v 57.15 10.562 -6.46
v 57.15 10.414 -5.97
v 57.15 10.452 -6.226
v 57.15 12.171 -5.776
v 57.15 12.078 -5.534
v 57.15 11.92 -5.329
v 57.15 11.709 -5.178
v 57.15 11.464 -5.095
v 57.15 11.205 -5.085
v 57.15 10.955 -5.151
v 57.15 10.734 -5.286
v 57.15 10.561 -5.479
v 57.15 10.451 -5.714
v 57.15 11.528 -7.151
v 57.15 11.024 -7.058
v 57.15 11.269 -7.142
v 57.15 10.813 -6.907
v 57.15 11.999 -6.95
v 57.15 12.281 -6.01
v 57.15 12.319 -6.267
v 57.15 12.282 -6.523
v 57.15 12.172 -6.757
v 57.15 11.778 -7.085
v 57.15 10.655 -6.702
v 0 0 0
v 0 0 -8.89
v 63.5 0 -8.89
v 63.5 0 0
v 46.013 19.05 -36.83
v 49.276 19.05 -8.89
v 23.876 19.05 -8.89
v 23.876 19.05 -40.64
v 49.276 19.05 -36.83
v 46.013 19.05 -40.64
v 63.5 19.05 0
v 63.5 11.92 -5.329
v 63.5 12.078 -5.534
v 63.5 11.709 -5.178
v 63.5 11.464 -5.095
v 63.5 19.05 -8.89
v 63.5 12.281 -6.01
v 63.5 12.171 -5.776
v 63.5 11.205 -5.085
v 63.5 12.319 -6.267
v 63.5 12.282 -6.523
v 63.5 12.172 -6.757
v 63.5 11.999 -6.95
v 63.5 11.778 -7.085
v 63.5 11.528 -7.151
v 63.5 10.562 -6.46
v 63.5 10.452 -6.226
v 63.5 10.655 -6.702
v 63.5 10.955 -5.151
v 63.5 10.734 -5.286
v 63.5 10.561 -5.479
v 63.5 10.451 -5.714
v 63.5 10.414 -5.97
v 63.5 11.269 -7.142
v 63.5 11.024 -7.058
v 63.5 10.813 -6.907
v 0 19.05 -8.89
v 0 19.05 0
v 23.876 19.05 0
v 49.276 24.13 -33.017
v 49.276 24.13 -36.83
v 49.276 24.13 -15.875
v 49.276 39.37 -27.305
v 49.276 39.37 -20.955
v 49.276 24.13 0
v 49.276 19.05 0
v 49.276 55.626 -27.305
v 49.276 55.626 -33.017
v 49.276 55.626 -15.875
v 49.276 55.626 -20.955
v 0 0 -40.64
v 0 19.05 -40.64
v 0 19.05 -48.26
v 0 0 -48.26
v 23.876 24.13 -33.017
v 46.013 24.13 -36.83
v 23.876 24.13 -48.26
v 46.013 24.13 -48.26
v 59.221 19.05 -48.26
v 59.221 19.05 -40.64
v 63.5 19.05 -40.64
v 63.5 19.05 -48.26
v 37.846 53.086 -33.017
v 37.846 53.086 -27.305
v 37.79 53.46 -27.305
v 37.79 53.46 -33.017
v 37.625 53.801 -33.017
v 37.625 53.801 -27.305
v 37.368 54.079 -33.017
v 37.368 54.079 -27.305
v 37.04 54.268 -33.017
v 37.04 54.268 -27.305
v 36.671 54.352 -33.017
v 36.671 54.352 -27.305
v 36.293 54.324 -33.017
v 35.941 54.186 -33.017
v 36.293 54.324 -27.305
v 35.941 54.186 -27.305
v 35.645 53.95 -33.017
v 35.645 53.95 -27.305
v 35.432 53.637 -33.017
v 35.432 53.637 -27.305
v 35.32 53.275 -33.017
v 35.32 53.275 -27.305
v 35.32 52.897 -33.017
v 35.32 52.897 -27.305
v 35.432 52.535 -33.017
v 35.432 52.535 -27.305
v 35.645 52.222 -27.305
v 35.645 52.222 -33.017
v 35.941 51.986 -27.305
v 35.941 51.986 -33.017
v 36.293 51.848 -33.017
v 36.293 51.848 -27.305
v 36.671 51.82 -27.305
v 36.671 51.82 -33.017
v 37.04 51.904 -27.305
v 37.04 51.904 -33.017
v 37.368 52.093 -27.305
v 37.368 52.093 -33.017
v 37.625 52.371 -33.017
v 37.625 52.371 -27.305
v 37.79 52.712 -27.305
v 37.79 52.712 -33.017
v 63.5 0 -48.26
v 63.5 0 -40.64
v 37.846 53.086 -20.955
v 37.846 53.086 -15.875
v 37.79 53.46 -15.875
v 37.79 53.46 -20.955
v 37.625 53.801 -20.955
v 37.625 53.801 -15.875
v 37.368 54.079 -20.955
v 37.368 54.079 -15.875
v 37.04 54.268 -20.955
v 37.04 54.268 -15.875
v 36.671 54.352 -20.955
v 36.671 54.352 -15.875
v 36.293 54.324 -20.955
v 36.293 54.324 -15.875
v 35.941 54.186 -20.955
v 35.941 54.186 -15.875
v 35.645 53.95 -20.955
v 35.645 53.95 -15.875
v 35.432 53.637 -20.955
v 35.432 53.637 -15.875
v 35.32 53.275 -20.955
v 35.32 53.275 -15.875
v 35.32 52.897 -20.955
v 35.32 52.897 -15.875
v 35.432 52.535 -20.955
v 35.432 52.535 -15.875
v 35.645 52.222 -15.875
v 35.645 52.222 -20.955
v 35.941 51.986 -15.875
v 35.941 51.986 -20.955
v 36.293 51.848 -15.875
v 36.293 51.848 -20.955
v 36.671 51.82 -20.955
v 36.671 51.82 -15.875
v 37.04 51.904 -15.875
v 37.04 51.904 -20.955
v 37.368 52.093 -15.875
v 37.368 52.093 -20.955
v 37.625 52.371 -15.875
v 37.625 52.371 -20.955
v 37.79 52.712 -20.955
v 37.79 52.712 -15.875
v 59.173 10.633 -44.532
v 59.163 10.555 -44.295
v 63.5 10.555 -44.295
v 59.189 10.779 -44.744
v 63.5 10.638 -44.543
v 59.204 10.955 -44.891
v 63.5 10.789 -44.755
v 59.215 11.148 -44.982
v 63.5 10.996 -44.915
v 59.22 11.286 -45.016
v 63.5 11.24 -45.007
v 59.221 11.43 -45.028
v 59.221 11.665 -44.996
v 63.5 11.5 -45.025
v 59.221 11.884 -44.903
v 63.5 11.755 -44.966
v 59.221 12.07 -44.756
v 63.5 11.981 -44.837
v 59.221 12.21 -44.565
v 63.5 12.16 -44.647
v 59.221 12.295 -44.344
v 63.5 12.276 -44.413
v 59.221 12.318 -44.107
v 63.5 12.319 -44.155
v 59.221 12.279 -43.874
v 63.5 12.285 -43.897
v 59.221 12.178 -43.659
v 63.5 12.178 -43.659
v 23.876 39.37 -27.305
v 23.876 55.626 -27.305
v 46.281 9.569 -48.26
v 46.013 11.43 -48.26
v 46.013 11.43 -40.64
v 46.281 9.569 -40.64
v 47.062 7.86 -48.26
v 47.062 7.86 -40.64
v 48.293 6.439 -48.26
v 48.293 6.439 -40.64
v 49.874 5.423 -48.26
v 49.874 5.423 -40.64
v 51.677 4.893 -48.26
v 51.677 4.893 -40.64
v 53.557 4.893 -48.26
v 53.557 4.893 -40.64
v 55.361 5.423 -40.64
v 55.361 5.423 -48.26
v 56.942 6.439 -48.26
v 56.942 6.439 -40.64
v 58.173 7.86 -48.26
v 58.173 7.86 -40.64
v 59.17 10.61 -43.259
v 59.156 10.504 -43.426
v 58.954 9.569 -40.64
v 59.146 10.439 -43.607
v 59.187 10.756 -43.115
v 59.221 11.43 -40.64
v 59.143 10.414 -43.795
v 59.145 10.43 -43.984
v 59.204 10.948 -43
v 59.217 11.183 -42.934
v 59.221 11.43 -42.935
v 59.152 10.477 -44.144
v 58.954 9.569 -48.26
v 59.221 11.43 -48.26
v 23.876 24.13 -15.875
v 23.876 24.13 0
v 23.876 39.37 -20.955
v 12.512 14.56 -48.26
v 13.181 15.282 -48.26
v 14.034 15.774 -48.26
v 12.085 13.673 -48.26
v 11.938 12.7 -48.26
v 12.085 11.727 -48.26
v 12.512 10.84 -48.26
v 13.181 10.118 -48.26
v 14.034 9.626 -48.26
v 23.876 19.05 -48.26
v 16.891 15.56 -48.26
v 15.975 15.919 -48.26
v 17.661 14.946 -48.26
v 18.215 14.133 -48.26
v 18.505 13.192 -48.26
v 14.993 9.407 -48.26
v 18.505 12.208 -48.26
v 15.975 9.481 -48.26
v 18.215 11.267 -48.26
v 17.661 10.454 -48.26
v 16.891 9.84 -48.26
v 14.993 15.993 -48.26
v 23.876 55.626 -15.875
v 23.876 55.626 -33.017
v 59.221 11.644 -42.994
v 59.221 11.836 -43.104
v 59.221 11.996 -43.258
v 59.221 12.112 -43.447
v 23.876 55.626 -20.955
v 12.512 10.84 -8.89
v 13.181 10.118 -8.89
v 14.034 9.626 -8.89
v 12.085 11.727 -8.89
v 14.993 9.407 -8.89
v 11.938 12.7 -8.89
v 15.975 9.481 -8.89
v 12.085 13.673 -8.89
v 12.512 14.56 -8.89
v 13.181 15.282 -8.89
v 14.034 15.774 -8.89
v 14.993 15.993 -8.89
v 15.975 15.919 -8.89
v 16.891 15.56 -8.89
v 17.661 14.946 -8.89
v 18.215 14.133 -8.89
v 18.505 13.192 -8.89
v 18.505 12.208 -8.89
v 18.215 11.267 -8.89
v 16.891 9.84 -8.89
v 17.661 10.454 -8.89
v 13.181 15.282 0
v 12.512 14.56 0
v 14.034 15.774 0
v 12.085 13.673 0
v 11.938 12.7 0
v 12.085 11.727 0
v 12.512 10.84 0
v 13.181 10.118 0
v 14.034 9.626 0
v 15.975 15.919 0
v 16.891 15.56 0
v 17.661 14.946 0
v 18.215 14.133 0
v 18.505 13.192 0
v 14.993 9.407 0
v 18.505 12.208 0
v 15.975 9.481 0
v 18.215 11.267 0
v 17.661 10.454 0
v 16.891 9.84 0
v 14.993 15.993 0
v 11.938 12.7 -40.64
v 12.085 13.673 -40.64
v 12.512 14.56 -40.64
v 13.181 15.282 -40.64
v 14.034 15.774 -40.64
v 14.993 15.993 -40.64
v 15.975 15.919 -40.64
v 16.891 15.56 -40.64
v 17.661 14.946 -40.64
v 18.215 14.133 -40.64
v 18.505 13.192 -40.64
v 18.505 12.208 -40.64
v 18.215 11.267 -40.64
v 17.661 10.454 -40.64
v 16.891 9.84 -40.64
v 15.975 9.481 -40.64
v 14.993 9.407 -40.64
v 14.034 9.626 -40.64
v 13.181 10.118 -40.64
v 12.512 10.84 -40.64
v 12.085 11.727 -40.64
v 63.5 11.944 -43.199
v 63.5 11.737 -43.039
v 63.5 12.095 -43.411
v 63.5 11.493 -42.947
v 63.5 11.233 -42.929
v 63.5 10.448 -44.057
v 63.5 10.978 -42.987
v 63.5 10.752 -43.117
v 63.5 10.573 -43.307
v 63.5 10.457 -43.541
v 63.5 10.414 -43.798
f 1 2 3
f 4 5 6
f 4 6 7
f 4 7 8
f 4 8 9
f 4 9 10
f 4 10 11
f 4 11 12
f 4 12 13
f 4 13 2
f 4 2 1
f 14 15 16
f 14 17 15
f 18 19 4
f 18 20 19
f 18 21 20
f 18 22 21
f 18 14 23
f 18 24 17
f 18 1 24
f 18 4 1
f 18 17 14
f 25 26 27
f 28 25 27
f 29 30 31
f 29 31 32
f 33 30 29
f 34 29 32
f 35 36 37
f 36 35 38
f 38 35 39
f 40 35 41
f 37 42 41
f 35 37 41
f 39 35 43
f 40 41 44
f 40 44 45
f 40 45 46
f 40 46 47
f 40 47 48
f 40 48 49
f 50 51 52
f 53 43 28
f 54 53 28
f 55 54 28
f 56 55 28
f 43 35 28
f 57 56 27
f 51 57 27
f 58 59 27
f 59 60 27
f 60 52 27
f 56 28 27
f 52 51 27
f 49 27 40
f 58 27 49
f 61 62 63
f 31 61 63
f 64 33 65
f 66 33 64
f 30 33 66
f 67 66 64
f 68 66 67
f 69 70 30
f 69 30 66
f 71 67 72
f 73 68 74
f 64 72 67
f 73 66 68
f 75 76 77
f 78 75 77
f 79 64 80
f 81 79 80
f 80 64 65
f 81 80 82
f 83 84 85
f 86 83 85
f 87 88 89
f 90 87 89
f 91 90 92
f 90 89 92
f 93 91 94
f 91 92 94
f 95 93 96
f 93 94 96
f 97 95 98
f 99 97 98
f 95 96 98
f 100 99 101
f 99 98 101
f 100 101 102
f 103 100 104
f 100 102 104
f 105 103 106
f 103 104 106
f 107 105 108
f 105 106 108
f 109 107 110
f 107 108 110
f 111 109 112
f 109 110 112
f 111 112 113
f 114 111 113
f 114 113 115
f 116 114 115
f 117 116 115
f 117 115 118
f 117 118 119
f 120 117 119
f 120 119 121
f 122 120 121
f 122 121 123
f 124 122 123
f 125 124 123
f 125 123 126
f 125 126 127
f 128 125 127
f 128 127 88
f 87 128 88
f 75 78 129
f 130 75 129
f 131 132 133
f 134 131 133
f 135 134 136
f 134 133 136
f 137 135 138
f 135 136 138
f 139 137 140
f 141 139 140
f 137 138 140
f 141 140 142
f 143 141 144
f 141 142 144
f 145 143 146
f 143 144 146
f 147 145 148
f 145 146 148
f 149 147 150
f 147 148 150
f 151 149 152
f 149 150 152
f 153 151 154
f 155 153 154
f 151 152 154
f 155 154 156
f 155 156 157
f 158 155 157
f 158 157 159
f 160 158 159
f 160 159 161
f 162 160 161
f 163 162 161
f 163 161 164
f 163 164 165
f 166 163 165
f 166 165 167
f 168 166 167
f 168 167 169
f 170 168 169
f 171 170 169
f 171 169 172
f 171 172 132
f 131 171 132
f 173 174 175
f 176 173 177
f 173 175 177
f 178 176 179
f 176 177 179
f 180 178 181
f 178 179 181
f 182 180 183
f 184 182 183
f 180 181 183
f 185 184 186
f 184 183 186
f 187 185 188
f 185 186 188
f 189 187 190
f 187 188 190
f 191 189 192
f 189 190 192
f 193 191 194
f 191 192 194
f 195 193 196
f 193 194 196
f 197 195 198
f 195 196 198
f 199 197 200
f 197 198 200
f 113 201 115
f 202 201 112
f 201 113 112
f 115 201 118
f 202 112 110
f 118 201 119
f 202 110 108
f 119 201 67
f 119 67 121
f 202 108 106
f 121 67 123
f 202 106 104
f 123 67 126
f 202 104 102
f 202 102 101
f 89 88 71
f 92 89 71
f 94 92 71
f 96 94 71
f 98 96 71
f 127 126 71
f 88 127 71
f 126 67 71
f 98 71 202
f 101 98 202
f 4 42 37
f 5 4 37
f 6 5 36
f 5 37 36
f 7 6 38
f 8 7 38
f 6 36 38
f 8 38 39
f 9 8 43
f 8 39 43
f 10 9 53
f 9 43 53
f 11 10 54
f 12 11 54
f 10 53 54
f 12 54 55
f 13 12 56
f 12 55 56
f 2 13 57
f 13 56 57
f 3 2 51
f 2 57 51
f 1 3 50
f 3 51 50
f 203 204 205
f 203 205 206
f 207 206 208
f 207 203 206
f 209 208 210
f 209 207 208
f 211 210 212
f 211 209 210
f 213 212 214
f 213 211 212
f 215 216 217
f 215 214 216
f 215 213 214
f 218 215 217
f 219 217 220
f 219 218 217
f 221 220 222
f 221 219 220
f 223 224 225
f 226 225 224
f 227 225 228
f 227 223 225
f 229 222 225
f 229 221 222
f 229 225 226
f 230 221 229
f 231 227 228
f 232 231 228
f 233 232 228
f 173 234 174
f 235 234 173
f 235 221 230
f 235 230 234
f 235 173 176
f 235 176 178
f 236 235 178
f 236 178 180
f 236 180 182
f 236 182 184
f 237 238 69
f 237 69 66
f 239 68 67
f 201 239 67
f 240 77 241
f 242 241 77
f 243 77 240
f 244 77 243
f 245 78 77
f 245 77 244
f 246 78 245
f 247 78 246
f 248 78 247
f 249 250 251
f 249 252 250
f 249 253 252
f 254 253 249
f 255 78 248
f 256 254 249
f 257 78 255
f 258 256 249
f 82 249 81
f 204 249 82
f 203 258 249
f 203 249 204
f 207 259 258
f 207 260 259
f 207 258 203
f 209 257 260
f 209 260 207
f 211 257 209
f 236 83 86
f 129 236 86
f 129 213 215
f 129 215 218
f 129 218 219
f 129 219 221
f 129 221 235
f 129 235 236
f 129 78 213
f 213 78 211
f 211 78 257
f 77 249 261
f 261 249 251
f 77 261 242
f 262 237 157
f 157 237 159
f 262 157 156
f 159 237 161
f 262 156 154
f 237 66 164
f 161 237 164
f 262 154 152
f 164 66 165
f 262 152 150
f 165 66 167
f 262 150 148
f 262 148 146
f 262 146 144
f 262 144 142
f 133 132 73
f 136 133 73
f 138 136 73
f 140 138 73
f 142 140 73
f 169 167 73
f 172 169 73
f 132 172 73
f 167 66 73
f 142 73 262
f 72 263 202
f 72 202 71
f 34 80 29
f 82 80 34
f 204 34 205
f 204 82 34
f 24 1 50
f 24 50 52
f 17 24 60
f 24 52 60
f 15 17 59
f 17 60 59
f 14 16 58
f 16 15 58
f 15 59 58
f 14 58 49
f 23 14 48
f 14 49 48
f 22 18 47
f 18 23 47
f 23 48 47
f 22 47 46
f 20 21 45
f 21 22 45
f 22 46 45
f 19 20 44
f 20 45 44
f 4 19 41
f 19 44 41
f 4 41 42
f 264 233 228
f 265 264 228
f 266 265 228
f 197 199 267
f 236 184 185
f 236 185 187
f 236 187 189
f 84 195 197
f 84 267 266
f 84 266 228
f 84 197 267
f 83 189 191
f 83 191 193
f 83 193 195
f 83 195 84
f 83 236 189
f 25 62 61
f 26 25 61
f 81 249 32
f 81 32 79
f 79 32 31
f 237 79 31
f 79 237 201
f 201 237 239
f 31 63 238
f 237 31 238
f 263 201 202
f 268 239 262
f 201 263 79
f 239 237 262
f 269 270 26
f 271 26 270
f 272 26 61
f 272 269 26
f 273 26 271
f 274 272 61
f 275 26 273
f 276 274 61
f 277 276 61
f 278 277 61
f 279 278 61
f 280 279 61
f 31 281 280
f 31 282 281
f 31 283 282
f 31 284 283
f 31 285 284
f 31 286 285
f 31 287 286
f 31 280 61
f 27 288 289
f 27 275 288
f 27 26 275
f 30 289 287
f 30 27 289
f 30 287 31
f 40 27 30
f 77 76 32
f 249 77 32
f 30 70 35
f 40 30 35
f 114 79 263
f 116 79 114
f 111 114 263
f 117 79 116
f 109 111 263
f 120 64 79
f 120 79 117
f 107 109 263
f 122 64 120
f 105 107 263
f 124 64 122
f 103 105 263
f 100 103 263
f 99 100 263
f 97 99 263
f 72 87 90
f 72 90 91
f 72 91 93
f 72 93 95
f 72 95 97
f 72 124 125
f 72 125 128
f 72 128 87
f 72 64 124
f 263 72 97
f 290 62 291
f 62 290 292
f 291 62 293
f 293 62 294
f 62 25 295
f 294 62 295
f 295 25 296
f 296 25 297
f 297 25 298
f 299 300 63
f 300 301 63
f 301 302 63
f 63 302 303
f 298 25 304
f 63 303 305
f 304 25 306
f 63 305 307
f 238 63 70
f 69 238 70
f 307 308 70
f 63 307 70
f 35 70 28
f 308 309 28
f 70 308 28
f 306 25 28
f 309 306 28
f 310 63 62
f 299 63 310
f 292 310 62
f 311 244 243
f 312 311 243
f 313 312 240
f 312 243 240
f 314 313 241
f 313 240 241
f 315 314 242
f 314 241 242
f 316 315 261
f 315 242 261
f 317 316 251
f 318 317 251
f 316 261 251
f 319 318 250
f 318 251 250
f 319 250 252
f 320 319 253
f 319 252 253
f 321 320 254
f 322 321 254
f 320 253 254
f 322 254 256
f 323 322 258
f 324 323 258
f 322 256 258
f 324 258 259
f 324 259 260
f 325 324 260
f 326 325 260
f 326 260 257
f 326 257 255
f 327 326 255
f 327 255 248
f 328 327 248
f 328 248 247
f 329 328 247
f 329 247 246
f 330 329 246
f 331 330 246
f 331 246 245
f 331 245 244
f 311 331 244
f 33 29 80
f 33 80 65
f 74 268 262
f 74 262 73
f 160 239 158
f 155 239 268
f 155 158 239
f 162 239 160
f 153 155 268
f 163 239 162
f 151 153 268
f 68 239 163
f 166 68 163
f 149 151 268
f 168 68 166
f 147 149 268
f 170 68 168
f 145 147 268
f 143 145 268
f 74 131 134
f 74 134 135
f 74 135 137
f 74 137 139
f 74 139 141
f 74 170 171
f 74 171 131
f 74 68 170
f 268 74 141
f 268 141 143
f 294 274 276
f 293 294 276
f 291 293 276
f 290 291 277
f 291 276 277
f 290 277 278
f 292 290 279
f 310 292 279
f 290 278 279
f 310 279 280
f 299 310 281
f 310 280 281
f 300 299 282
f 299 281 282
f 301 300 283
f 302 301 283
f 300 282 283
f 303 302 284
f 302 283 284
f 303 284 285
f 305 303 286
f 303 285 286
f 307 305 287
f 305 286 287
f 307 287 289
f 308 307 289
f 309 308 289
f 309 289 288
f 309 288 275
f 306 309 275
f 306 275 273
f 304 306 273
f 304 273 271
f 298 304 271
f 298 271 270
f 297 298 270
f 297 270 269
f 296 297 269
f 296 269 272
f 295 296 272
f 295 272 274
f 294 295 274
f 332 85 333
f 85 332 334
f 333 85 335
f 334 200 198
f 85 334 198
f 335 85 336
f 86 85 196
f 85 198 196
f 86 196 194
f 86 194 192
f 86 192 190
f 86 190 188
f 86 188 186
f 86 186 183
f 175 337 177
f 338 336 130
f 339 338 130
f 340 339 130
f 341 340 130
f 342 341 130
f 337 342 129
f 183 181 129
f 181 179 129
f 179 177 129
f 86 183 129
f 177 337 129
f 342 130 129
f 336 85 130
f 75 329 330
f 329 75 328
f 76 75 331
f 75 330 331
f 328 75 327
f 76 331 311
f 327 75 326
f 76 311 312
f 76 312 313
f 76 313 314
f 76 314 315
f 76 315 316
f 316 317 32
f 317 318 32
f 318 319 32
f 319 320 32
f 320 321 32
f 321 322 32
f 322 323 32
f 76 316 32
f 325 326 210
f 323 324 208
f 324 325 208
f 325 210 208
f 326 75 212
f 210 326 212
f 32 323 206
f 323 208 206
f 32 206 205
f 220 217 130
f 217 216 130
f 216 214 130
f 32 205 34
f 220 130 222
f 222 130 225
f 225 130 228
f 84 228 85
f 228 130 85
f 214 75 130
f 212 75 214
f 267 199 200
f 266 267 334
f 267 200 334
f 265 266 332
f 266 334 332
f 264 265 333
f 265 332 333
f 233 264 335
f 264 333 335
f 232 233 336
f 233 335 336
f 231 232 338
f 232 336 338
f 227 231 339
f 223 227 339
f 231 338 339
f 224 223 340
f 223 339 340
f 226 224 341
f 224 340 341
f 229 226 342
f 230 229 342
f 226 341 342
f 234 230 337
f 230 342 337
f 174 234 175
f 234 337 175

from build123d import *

# Parameters (mm, degrees)
SKETCH1_W           = 63.5
SKETCH1_H           = 48.26
BOSS_EXTRUDE1_DEPTH = 55.626
SKETCH2_W           = 31.75
SKETCH2_H           = 19.05
SKETCH2_W_2         = 15.242568483
SKETCH2_H_2         = 31.496
SKETCH2_W_3         = 6.35
SKETCH2_H_3         = 16.256
SKETCH2_W_4         = 15.875
CUT_EXTRUDE2_DEPTH  = 64.5
SKETCH3_W           = 23.876
SKETCH3_H           = 36.576
SKETCH3_W_2         = 14.224
CUT_EXTRUDE3_DEPTH  = 49.26
SKETCH4_R           = 1.27
CUT_EXTRUDE4_DEPTH  = 33.385
CUT_EXTRUDE6_REACH  = 50.26
SKETCH6_R           = 3.302
SKETCH7_R           = 3.302
CUT_EXTRUDE7_DEPTH  = 49.26
CUT_EXTRUDE11_DEPTH = 11.43
SKETCH10_R          = 0.889
CUT_EXTRUDE10_DEPTH = 6.35
SKETCH9_R           = 0.889
CUT_EXTRUDE9_DEPTH  = 6.35


with BuildPart() as part:
    # Sketch1 → Boss-Extrude1 (new body)
    with BuildSketch(Plane(origin=(0, 0, 0), x_dir=(1, 0, 0), z_dir=(0, 1, 0))):
        with Locations((31.75, 24.13)):
            Rectangle(SKETCH1_W, SKETCH1_H)
    extrude(amount=BOSS_EXTRUDE1_DEPTH)

    # Sketch2 → Cut-Extrude2 (cut, through all)
    with BuildSketch(Plane(origin=(63.5, 0, 0), x_dir=(0, 0, -1), z_dir=(1, 0, 0))):
        with Locations((24.765, 9.525)):
            Rectangle(SKETCH2_W, SKETCH2_H)
        with Locations((40.638715758, 39.878)):
            Rectangle(SKETCH2_W_2, SKETCH2_H_2)
        with Locations((24.13, 47.498)):
            Rectangle(SKETCH2_W_3, SKETCH2_H_3)
        with Locations((7.9375, 39.878)):
            Rectangle(SKETCH2_W_4, SKETCH2_H_2)
    extrude(amount=-CUT_EXTRUDE2_DEPTH, mode=Mode.SUBTRACT)

    # Sketch3 → Cut-Extrude3 (cut, through all)
    with BuildSketch(Plane.XY):
        with Locations((11.938, 37.338)):
            Rectangle(SKETCH3_W, SKETCH3_H)
        with Locations((56.388, 37.338)):
            Rectangle(SKETCH3_W_2, SKETCH3_H)
    extrude(amount=-CUT_EXTRUDE3_DEPTH, mode=Mode.SUBTRACT)

    # Sketch4 → Cut-Extrude4 (cut, through all)
    with BuildSketch(Plane.XY.offset(-15.875)):
        with Locations((36.576, 53.086)):
            Circle(SKETCH4_R)
    extrude(amount=-CUT_EXTRUDE4_DEPTH, mode=Mode.SUBTRACT)

    # Sketch6 → Cut-Extrude6 (cut, up to next)
    with BuildSketch(Plane(origin=(0, 0, -48.26), x_dir=(-1, 0, 0), z_dir=(0, 0, -1)), mode=Mode.PRIVATE) as cut_extrude6_sk1:
        with Locations((-15.24, 12.7)):
            Circle(SKETCH6_R)
    cut_extrude6_tool1 = extrude(cut_extrude6_sk1.sketch, amount=-CUT_EXTRUDE6_REACH, mode=Mode.PRIVATE) & part.part
    add(cut_extrude6_tool1.solids().sort_by_distance((15.24, 12.7, -48.26))[0], mode=Mode.SUBTRACT)

    # Sketch7 → Cut-Extrude7 (cut, through all)
    with BuildSketch(Plane(origin=(0, 0, -48.26), x_dir=(-1, 0, 0), z_dir=(0, 0, -1))):
        with Locations((-15.24, 12.7)):
            Circle(SKETCH7_R)
    extrude(amount=-CUT_EXTRUDE7_DEPTH, mode=Mode.SUBTRACT)

    # Sketch8 → Cut-Extrude11 (cut)
    with BuildSketch(Plane(origin=(0, 0, -48.26), x_dir=(-1, 0, 0), z_dir=(0, 0, -1))):
        with BuildLine():
            Line((-49.276, 24.13), (-46.013321356, 24.13))
            Line((-46.013321356, 24.13), (-46.013321356, 11.43))
            ThreePointArc((-46.013321356, 11.43), (-52.617321356, 4.826), (-59.221321356, 11.43))
            Line((-59.221321356, 11.43), (-59.221321356, 19.05))
            Line((-59.221321356, 19.05), (-49.276, 19.05))
            Line((-49.276, 19.05), (-49.276, 24.13))
        make_face()
    extrude(amount=-CUT_EXTRUDE11_DEPTH, mode=Mode.SUBTRACT)

    # Sketch10 → Cut-Extrude10 (cut)
    with BuildSketch(Plane(origin=(63.5, 0, 0), x_dir=(0, 0, -1), z_dir=(1, 0, 0))):
        with Locations((6.26745, 11.43)):
            Circle(SKETCH10_R)
        with Locations((44.13885, 11.43)):
            Circle(SKETCH10_R)
    extrude(amount=-CUT_EXTRUDE10_DEPTH, mode=Mode.SUBTRACT)

    # Sketch9 → Cut-Extrude9 (cut)
    with BuildSketch(Plane(origin=(63.5, 0, 0), x_dir=(0, 0, -1), z_dir=(1, 0, 0))):
        with Locations((5.969, 11.303)):
            Circle(SKETCH9_R)
        with Locations((43.815, 11.303)):
            Circle(SKETCH9_R)
    extrude(amount=-CUT_EXTRUDE9_DEPTH, mode=Mode.SUBTRACT)


solid = part.part
